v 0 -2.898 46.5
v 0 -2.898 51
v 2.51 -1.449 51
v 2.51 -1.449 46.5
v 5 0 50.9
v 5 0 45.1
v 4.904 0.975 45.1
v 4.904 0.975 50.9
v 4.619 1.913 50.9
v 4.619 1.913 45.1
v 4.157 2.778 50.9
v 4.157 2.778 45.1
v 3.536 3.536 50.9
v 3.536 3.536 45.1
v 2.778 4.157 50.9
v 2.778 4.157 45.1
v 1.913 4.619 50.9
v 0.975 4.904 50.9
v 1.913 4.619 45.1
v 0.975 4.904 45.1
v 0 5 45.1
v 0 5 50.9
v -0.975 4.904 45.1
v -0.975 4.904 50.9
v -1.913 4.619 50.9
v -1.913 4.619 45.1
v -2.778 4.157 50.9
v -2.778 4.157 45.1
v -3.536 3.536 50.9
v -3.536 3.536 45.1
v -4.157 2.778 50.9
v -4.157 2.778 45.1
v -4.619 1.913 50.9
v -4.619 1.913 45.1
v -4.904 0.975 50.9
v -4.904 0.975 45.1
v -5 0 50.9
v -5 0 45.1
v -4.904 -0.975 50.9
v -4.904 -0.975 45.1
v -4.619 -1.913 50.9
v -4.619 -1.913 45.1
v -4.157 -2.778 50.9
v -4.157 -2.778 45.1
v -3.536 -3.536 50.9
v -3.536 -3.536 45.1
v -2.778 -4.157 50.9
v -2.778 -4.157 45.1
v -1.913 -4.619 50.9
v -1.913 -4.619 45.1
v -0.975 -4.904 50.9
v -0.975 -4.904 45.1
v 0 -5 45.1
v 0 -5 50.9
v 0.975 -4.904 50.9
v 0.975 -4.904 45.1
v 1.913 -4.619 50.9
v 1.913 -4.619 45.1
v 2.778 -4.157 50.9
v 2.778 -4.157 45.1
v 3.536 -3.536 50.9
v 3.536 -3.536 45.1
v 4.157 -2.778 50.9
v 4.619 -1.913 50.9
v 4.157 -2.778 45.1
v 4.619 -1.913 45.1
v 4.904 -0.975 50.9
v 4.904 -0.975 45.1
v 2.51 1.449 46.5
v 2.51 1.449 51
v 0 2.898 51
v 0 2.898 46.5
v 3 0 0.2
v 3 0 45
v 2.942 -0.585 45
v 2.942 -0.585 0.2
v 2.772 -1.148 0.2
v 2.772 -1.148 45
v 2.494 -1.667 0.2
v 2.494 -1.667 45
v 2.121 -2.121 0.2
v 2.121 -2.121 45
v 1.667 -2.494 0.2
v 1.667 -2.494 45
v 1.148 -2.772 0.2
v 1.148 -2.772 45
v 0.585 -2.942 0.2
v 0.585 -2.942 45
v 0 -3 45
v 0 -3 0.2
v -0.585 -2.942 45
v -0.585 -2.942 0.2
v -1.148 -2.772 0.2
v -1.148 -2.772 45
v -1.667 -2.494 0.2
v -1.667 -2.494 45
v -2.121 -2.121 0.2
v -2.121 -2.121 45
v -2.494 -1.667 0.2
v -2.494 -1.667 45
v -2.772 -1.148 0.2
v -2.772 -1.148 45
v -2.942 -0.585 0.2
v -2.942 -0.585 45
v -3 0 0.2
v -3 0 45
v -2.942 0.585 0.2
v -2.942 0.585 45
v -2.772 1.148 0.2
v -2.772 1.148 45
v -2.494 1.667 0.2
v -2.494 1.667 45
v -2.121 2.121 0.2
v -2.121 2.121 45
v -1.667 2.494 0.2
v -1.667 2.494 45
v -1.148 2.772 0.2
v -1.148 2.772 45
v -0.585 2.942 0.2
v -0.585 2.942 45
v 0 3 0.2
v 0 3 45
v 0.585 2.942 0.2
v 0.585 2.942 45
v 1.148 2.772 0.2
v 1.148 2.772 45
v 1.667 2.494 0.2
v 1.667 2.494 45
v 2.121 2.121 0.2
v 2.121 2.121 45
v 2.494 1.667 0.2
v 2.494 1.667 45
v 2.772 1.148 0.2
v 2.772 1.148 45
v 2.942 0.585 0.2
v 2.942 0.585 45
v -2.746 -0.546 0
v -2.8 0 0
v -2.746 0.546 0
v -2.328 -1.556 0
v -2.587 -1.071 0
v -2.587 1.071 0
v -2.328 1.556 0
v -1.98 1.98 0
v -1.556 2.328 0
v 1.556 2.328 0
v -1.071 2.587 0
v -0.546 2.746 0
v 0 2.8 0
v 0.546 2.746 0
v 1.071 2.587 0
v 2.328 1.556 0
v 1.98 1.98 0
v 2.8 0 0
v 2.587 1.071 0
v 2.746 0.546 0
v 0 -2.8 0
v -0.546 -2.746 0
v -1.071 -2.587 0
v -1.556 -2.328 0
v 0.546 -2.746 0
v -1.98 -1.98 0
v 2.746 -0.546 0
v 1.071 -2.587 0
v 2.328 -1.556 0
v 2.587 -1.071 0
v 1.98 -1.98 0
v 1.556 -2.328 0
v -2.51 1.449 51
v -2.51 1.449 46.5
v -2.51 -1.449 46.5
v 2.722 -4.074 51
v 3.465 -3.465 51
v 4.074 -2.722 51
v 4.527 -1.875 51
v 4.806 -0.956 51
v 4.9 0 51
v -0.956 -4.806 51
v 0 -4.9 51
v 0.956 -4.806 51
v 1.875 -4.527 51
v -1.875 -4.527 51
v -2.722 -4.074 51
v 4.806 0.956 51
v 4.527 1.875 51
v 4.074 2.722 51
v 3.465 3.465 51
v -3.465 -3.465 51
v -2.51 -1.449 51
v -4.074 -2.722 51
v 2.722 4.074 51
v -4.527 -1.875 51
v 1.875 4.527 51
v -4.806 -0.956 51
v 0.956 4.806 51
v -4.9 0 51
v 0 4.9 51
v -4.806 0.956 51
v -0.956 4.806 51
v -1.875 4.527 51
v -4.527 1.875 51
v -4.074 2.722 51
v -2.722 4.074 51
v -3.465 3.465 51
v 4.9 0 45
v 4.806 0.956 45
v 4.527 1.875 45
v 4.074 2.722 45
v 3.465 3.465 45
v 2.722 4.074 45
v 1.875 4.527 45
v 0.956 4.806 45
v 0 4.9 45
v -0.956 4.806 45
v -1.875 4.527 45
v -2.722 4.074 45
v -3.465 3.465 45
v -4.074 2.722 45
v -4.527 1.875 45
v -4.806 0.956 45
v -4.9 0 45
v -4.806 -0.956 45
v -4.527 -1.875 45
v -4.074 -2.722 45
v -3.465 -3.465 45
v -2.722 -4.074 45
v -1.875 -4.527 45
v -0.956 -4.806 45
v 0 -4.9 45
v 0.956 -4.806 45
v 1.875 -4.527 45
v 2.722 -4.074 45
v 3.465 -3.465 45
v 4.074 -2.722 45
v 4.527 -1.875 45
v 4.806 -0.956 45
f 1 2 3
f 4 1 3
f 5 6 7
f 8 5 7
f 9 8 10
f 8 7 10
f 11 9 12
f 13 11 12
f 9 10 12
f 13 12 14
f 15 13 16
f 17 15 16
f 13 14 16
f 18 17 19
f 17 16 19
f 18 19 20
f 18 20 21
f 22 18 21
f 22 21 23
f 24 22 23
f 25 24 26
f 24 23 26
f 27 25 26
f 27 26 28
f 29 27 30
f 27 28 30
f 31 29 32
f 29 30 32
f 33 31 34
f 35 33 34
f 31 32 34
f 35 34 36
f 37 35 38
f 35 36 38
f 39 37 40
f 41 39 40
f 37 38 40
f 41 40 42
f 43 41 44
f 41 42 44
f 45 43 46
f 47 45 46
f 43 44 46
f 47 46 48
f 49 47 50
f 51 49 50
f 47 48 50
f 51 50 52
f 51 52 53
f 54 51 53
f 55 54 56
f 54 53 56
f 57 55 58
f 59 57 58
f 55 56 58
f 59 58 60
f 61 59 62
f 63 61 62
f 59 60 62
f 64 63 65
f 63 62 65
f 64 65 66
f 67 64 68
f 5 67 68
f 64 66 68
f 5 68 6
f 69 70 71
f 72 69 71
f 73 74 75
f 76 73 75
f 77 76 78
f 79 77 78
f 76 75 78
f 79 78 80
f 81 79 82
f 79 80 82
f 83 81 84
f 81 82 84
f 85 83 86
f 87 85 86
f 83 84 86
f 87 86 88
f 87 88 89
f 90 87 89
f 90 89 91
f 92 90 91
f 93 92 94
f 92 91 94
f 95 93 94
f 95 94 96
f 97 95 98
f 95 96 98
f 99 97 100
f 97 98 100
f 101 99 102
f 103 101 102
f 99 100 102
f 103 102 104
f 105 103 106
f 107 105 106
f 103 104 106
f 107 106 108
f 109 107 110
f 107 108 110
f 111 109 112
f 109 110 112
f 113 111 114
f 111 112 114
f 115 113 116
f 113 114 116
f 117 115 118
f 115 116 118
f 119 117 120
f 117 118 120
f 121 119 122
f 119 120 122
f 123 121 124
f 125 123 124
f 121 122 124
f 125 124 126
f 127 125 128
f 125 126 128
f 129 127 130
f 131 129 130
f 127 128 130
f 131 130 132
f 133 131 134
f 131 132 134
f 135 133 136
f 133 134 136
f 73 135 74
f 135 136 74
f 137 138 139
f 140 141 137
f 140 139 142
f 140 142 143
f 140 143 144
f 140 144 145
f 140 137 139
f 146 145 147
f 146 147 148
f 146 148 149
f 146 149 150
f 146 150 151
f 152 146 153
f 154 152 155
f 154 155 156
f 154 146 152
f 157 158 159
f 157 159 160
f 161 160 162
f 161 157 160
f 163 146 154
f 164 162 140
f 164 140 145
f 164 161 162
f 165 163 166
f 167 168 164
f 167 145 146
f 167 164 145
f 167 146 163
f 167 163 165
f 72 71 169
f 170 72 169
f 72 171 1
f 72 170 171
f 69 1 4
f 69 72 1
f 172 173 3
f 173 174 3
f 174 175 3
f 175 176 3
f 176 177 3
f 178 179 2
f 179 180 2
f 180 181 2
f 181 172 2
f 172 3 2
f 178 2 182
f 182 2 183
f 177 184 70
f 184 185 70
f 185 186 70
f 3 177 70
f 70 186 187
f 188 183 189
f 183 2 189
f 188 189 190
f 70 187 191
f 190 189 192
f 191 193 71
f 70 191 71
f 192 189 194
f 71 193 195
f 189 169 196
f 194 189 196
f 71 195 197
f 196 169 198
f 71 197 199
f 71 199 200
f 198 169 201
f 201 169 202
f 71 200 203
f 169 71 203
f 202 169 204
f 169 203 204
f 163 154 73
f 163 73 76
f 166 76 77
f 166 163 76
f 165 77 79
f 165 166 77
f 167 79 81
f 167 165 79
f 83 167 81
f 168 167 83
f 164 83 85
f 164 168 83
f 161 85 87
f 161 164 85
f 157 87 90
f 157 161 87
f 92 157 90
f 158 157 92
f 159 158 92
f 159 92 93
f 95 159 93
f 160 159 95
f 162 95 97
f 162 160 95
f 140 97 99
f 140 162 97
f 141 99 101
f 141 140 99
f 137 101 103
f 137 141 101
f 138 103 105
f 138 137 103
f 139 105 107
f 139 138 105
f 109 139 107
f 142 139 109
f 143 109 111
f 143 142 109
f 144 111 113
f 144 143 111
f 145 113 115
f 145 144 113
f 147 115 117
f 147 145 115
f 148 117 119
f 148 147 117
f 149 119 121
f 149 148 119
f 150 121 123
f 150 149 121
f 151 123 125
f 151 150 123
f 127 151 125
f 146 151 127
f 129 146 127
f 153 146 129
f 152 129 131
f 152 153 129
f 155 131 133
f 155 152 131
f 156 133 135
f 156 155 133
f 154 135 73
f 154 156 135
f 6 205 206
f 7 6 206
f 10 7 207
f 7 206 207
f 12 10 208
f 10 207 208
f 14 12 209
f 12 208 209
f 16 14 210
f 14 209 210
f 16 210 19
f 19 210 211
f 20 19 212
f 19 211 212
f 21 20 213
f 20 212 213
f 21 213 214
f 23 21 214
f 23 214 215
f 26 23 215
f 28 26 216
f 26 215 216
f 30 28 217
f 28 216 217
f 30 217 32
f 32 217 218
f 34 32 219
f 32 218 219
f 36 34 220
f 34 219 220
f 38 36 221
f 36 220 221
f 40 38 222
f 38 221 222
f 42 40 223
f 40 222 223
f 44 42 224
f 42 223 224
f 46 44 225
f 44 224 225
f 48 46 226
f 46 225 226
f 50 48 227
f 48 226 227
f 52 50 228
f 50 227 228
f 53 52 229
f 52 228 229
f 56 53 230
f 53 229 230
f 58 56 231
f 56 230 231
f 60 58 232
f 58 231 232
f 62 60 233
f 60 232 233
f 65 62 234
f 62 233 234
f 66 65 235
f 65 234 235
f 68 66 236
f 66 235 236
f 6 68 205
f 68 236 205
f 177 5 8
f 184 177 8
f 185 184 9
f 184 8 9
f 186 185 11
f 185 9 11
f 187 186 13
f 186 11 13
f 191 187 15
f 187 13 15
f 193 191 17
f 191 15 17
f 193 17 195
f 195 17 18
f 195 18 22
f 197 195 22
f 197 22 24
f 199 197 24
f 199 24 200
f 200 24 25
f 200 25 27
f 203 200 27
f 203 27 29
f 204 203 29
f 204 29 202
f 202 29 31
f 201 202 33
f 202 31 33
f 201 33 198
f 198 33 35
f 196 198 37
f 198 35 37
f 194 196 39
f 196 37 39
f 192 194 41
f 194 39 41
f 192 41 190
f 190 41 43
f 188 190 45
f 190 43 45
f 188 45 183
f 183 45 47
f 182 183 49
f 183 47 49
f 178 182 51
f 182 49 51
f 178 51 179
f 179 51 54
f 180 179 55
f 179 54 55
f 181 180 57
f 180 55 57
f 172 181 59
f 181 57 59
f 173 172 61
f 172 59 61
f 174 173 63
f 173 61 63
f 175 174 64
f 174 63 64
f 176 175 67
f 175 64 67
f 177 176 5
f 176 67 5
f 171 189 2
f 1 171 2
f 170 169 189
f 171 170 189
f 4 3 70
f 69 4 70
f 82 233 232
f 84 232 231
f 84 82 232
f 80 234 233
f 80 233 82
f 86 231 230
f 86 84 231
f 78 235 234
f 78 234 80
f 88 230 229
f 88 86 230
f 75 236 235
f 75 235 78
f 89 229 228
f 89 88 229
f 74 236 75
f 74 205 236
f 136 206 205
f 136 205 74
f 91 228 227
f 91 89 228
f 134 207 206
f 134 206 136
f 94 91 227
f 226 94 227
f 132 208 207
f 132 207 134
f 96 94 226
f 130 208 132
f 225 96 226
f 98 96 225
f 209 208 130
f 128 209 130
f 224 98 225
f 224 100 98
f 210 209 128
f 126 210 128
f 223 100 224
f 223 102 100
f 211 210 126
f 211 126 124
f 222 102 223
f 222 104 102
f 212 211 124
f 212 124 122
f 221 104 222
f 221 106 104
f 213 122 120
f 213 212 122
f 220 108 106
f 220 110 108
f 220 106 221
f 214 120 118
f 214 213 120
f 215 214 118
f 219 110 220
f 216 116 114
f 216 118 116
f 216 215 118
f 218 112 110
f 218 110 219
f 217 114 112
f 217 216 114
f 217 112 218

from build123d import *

# Parameters (mm, degrees)
SKETCH_1_W          = 5
SKETCH_1_H          = 6
SKETCH_2_R          = 3
EXTRUDE_1_DEPTH     = 45
CUT_EXTRUDE_1_DEPTH = 4.5
CHAMFER_1_SIZE2     = 0.100043834
CHAMFER_1_SIZE      = 0.100042957
CHAMFER_2_SIZE      = 0.20006968
CHAMFER_2_SIZE2     = 0.200074659


with BuildPart() as part:
    # 草图1 → 旋转1 (revolve)
    with BuildSketch(Plane(origin=(0, 0, 0), x_dir=(1, 0, 0), z_dir=(0, 1, 0))):
        with Locations((2.5, -48)):
            Rectangle(SKETCH_1_W, SKETCH_1_H)
    revolve(axis=Axis((0, 0, 45), (0, 0, 1)))

    # 草图2 → 凸台-拉伸1 (add)
    with BuildSketch(Plane(origin=(0, 0, 45), x_dir=(-1, 0, 0), z_dir=(0, 0, -1))):
        with Locations(Location((0, 0, 0), (0, 0, 180))):
            Circle(SKETCH_2_R)
    extrude(amount=EXTRUDE_1_DEPTH)

    # 草图3 → 切除-拉伸1 (cut)
    with BuildSketch(Plane.XY.offset(51)):
        Polygon((-2.51, -1.449149176), (0, -2.898298351), (2.51, -1.449149176), (2.51, 1.449149176), (0, 2.898298351), (-2.51, 1.449149176), align=None)
    extrude(amount=-CUT_EXTRUDE_1_DEPTH, mode=Mode.SUBTRACT)

    # 倒角1
    chamfer_1_edges = [part.edges().sort_by_distance(p)[0] for p in [
        (-5, 0, 51),
        (-5, 0, 45),
    ]]
    chamfer(chamfer_1_edges, length=CHAMFER_1_SIZE, length2=CHAMFER_1_SIZE2)

    # 倒角2
    chamfer_2_edges = [part.edges().sort_by_distance(p)[0] for p in [
        (-3, 0, 0),
    ]]
    chamfer_2_side = [part.faces().sort_by_distance(p)[0] for p in [
        (-3, 0, 22.5),
    ]]
    chamfer(chamfer_2_edges, length=CHAMFER_2_SIZE, length2=CHAMFER_2_SIZE2, reference=chamfer_2_side[0])


solid = part.part
